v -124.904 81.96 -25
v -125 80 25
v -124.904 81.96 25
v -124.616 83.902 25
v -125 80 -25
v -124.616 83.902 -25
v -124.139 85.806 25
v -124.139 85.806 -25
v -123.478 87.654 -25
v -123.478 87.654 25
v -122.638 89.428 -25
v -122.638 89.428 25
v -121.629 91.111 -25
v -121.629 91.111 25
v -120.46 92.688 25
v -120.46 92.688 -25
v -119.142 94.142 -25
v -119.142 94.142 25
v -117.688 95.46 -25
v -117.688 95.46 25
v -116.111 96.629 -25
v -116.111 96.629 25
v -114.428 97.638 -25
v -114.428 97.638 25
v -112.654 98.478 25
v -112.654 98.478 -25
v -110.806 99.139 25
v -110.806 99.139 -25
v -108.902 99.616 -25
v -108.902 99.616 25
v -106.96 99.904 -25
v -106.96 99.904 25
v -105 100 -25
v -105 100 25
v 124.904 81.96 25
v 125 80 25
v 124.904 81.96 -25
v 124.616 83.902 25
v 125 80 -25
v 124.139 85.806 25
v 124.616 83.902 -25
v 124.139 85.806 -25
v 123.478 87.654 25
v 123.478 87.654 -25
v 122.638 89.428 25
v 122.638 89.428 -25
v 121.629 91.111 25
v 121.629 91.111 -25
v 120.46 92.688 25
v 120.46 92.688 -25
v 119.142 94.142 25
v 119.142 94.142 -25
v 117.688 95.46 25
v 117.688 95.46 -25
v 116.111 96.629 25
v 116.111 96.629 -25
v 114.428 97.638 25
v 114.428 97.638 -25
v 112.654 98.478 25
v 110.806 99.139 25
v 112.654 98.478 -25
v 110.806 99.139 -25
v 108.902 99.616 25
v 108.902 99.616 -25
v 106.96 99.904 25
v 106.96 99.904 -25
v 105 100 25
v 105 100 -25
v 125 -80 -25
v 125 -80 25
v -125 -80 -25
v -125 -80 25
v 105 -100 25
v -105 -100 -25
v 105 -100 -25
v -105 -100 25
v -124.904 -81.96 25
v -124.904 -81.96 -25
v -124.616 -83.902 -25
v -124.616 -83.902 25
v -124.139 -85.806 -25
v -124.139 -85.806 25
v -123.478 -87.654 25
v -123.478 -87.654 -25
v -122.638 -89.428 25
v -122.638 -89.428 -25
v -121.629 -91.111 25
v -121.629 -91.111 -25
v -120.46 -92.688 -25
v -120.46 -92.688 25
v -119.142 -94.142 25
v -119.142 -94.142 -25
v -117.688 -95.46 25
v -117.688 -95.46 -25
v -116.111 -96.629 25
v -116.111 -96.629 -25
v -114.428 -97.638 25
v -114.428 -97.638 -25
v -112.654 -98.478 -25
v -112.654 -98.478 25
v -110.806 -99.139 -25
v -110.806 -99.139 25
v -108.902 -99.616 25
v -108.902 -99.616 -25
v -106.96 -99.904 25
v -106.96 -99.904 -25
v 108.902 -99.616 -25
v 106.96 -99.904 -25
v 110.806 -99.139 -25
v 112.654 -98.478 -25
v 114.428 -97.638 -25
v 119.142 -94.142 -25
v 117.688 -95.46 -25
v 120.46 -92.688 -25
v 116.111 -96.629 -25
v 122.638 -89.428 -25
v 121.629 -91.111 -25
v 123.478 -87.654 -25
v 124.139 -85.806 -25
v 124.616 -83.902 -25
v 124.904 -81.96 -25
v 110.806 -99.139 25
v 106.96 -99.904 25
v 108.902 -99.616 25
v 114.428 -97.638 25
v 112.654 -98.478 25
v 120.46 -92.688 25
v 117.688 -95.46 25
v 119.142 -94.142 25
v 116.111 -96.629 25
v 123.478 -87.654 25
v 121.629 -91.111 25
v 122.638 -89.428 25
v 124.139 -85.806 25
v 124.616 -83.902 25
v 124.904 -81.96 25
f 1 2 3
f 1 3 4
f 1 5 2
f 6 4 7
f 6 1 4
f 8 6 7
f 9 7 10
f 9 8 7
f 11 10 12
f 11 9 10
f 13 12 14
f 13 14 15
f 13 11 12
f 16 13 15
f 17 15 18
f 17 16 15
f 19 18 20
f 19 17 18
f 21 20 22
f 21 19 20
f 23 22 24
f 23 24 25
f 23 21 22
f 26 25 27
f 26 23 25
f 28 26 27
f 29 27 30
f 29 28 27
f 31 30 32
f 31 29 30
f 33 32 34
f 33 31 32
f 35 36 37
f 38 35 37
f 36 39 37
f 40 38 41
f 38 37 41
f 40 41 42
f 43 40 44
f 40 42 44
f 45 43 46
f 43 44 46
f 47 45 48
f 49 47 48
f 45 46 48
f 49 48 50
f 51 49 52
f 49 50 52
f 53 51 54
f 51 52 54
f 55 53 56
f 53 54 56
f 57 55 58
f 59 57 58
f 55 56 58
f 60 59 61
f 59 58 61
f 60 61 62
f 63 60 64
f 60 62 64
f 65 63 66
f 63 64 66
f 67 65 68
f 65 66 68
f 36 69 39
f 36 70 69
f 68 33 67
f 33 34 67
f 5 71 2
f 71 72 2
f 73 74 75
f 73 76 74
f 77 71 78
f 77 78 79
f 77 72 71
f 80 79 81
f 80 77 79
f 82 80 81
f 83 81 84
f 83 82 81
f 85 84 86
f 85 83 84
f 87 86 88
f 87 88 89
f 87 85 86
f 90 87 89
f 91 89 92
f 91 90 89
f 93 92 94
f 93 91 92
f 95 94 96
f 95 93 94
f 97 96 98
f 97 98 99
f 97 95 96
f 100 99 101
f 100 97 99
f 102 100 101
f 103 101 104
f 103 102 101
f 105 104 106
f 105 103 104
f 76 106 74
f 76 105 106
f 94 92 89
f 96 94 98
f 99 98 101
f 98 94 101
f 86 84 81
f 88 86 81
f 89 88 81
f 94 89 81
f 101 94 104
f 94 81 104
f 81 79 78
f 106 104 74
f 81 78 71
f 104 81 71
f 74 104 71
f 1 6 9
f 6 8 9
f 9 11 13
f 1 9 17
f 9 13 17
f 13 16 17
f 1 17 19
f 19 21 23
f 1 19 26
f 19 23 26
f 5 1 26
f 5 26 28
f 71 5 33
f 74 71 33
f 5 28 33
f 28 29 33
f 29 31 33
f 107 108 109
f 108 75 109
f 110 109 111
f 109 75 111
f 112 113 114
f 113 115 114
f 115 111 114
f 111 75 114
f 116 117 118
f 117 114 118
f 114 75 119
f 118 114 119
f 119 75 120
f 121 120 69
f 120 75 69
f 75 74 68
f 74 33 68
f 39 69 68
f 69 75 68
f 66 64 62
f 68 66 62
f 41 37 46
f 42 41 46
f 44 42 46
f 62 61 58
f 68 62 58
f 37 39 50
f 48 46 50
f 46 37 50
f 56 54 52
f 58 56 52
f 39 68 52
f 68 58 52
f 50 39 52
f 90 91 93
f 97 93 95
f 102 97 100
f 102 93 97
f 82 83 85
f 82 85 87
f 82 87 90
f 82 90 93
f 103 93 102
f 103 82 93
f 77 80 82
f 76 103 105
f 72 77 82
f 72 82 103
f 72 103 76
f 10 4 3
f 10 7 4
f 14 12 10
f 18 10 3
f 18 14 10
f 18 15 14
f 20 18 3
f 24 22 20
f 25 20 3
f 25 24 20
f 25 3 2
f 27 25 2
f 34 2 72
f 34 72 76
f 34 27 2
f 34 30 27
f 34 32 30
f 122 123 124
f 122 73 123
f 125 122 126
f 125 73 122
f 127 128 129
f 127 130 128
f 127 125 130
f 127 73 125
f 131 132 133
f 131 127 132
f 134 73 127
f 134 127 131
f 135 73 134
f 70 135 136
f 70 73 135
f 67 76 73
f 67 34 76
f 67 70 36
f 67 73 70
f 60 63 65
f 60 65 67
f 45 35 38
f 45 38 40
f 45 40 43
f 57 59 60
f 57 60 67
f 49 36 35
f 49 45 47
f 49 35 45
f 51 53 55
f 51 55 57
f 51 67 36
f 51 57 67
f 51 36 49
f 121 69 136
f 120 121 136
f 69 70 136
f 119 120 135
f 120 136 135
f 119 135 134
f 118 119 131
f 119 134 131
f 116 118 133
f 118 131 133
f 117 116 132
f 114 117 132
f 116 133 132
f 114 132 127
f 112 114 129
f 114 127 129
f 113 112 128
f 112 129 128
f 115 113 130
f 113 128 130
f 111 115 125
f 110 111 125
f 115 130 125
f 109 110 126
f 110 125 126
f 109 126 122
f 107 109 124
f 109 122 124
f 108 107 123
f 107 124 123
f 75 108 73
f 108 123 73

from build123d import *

# Parameters (mm, degrees)
SKETCH1_W           = 250
SKETCH1_H           = 200
BOSS_EXTRUDE1_DEPTH = 25
FILLET1_R           = 20


with BuildPart() as part:
    # Sketch1 → Boss-Extrude1 (new body, symmetric)
    with BuildSketch(Plane.XY):
        Rectangle(SKETCH1_W, SKETCH1_H)
    extrude(amount=BOSS_EXTRUDE1_DEPTH, both=True)

    # Fillet1
    fillet1_edges = [part.edges().sort_by_distance(p)[0] for p in [
        (125, -100, 0),
        (-125, -100, 0),
        (-125, 100, 0),
        (125, 100, 0),
    ]]
    fillet(fillet1_edges, radius=FILLET1_R)


solid = part.part
